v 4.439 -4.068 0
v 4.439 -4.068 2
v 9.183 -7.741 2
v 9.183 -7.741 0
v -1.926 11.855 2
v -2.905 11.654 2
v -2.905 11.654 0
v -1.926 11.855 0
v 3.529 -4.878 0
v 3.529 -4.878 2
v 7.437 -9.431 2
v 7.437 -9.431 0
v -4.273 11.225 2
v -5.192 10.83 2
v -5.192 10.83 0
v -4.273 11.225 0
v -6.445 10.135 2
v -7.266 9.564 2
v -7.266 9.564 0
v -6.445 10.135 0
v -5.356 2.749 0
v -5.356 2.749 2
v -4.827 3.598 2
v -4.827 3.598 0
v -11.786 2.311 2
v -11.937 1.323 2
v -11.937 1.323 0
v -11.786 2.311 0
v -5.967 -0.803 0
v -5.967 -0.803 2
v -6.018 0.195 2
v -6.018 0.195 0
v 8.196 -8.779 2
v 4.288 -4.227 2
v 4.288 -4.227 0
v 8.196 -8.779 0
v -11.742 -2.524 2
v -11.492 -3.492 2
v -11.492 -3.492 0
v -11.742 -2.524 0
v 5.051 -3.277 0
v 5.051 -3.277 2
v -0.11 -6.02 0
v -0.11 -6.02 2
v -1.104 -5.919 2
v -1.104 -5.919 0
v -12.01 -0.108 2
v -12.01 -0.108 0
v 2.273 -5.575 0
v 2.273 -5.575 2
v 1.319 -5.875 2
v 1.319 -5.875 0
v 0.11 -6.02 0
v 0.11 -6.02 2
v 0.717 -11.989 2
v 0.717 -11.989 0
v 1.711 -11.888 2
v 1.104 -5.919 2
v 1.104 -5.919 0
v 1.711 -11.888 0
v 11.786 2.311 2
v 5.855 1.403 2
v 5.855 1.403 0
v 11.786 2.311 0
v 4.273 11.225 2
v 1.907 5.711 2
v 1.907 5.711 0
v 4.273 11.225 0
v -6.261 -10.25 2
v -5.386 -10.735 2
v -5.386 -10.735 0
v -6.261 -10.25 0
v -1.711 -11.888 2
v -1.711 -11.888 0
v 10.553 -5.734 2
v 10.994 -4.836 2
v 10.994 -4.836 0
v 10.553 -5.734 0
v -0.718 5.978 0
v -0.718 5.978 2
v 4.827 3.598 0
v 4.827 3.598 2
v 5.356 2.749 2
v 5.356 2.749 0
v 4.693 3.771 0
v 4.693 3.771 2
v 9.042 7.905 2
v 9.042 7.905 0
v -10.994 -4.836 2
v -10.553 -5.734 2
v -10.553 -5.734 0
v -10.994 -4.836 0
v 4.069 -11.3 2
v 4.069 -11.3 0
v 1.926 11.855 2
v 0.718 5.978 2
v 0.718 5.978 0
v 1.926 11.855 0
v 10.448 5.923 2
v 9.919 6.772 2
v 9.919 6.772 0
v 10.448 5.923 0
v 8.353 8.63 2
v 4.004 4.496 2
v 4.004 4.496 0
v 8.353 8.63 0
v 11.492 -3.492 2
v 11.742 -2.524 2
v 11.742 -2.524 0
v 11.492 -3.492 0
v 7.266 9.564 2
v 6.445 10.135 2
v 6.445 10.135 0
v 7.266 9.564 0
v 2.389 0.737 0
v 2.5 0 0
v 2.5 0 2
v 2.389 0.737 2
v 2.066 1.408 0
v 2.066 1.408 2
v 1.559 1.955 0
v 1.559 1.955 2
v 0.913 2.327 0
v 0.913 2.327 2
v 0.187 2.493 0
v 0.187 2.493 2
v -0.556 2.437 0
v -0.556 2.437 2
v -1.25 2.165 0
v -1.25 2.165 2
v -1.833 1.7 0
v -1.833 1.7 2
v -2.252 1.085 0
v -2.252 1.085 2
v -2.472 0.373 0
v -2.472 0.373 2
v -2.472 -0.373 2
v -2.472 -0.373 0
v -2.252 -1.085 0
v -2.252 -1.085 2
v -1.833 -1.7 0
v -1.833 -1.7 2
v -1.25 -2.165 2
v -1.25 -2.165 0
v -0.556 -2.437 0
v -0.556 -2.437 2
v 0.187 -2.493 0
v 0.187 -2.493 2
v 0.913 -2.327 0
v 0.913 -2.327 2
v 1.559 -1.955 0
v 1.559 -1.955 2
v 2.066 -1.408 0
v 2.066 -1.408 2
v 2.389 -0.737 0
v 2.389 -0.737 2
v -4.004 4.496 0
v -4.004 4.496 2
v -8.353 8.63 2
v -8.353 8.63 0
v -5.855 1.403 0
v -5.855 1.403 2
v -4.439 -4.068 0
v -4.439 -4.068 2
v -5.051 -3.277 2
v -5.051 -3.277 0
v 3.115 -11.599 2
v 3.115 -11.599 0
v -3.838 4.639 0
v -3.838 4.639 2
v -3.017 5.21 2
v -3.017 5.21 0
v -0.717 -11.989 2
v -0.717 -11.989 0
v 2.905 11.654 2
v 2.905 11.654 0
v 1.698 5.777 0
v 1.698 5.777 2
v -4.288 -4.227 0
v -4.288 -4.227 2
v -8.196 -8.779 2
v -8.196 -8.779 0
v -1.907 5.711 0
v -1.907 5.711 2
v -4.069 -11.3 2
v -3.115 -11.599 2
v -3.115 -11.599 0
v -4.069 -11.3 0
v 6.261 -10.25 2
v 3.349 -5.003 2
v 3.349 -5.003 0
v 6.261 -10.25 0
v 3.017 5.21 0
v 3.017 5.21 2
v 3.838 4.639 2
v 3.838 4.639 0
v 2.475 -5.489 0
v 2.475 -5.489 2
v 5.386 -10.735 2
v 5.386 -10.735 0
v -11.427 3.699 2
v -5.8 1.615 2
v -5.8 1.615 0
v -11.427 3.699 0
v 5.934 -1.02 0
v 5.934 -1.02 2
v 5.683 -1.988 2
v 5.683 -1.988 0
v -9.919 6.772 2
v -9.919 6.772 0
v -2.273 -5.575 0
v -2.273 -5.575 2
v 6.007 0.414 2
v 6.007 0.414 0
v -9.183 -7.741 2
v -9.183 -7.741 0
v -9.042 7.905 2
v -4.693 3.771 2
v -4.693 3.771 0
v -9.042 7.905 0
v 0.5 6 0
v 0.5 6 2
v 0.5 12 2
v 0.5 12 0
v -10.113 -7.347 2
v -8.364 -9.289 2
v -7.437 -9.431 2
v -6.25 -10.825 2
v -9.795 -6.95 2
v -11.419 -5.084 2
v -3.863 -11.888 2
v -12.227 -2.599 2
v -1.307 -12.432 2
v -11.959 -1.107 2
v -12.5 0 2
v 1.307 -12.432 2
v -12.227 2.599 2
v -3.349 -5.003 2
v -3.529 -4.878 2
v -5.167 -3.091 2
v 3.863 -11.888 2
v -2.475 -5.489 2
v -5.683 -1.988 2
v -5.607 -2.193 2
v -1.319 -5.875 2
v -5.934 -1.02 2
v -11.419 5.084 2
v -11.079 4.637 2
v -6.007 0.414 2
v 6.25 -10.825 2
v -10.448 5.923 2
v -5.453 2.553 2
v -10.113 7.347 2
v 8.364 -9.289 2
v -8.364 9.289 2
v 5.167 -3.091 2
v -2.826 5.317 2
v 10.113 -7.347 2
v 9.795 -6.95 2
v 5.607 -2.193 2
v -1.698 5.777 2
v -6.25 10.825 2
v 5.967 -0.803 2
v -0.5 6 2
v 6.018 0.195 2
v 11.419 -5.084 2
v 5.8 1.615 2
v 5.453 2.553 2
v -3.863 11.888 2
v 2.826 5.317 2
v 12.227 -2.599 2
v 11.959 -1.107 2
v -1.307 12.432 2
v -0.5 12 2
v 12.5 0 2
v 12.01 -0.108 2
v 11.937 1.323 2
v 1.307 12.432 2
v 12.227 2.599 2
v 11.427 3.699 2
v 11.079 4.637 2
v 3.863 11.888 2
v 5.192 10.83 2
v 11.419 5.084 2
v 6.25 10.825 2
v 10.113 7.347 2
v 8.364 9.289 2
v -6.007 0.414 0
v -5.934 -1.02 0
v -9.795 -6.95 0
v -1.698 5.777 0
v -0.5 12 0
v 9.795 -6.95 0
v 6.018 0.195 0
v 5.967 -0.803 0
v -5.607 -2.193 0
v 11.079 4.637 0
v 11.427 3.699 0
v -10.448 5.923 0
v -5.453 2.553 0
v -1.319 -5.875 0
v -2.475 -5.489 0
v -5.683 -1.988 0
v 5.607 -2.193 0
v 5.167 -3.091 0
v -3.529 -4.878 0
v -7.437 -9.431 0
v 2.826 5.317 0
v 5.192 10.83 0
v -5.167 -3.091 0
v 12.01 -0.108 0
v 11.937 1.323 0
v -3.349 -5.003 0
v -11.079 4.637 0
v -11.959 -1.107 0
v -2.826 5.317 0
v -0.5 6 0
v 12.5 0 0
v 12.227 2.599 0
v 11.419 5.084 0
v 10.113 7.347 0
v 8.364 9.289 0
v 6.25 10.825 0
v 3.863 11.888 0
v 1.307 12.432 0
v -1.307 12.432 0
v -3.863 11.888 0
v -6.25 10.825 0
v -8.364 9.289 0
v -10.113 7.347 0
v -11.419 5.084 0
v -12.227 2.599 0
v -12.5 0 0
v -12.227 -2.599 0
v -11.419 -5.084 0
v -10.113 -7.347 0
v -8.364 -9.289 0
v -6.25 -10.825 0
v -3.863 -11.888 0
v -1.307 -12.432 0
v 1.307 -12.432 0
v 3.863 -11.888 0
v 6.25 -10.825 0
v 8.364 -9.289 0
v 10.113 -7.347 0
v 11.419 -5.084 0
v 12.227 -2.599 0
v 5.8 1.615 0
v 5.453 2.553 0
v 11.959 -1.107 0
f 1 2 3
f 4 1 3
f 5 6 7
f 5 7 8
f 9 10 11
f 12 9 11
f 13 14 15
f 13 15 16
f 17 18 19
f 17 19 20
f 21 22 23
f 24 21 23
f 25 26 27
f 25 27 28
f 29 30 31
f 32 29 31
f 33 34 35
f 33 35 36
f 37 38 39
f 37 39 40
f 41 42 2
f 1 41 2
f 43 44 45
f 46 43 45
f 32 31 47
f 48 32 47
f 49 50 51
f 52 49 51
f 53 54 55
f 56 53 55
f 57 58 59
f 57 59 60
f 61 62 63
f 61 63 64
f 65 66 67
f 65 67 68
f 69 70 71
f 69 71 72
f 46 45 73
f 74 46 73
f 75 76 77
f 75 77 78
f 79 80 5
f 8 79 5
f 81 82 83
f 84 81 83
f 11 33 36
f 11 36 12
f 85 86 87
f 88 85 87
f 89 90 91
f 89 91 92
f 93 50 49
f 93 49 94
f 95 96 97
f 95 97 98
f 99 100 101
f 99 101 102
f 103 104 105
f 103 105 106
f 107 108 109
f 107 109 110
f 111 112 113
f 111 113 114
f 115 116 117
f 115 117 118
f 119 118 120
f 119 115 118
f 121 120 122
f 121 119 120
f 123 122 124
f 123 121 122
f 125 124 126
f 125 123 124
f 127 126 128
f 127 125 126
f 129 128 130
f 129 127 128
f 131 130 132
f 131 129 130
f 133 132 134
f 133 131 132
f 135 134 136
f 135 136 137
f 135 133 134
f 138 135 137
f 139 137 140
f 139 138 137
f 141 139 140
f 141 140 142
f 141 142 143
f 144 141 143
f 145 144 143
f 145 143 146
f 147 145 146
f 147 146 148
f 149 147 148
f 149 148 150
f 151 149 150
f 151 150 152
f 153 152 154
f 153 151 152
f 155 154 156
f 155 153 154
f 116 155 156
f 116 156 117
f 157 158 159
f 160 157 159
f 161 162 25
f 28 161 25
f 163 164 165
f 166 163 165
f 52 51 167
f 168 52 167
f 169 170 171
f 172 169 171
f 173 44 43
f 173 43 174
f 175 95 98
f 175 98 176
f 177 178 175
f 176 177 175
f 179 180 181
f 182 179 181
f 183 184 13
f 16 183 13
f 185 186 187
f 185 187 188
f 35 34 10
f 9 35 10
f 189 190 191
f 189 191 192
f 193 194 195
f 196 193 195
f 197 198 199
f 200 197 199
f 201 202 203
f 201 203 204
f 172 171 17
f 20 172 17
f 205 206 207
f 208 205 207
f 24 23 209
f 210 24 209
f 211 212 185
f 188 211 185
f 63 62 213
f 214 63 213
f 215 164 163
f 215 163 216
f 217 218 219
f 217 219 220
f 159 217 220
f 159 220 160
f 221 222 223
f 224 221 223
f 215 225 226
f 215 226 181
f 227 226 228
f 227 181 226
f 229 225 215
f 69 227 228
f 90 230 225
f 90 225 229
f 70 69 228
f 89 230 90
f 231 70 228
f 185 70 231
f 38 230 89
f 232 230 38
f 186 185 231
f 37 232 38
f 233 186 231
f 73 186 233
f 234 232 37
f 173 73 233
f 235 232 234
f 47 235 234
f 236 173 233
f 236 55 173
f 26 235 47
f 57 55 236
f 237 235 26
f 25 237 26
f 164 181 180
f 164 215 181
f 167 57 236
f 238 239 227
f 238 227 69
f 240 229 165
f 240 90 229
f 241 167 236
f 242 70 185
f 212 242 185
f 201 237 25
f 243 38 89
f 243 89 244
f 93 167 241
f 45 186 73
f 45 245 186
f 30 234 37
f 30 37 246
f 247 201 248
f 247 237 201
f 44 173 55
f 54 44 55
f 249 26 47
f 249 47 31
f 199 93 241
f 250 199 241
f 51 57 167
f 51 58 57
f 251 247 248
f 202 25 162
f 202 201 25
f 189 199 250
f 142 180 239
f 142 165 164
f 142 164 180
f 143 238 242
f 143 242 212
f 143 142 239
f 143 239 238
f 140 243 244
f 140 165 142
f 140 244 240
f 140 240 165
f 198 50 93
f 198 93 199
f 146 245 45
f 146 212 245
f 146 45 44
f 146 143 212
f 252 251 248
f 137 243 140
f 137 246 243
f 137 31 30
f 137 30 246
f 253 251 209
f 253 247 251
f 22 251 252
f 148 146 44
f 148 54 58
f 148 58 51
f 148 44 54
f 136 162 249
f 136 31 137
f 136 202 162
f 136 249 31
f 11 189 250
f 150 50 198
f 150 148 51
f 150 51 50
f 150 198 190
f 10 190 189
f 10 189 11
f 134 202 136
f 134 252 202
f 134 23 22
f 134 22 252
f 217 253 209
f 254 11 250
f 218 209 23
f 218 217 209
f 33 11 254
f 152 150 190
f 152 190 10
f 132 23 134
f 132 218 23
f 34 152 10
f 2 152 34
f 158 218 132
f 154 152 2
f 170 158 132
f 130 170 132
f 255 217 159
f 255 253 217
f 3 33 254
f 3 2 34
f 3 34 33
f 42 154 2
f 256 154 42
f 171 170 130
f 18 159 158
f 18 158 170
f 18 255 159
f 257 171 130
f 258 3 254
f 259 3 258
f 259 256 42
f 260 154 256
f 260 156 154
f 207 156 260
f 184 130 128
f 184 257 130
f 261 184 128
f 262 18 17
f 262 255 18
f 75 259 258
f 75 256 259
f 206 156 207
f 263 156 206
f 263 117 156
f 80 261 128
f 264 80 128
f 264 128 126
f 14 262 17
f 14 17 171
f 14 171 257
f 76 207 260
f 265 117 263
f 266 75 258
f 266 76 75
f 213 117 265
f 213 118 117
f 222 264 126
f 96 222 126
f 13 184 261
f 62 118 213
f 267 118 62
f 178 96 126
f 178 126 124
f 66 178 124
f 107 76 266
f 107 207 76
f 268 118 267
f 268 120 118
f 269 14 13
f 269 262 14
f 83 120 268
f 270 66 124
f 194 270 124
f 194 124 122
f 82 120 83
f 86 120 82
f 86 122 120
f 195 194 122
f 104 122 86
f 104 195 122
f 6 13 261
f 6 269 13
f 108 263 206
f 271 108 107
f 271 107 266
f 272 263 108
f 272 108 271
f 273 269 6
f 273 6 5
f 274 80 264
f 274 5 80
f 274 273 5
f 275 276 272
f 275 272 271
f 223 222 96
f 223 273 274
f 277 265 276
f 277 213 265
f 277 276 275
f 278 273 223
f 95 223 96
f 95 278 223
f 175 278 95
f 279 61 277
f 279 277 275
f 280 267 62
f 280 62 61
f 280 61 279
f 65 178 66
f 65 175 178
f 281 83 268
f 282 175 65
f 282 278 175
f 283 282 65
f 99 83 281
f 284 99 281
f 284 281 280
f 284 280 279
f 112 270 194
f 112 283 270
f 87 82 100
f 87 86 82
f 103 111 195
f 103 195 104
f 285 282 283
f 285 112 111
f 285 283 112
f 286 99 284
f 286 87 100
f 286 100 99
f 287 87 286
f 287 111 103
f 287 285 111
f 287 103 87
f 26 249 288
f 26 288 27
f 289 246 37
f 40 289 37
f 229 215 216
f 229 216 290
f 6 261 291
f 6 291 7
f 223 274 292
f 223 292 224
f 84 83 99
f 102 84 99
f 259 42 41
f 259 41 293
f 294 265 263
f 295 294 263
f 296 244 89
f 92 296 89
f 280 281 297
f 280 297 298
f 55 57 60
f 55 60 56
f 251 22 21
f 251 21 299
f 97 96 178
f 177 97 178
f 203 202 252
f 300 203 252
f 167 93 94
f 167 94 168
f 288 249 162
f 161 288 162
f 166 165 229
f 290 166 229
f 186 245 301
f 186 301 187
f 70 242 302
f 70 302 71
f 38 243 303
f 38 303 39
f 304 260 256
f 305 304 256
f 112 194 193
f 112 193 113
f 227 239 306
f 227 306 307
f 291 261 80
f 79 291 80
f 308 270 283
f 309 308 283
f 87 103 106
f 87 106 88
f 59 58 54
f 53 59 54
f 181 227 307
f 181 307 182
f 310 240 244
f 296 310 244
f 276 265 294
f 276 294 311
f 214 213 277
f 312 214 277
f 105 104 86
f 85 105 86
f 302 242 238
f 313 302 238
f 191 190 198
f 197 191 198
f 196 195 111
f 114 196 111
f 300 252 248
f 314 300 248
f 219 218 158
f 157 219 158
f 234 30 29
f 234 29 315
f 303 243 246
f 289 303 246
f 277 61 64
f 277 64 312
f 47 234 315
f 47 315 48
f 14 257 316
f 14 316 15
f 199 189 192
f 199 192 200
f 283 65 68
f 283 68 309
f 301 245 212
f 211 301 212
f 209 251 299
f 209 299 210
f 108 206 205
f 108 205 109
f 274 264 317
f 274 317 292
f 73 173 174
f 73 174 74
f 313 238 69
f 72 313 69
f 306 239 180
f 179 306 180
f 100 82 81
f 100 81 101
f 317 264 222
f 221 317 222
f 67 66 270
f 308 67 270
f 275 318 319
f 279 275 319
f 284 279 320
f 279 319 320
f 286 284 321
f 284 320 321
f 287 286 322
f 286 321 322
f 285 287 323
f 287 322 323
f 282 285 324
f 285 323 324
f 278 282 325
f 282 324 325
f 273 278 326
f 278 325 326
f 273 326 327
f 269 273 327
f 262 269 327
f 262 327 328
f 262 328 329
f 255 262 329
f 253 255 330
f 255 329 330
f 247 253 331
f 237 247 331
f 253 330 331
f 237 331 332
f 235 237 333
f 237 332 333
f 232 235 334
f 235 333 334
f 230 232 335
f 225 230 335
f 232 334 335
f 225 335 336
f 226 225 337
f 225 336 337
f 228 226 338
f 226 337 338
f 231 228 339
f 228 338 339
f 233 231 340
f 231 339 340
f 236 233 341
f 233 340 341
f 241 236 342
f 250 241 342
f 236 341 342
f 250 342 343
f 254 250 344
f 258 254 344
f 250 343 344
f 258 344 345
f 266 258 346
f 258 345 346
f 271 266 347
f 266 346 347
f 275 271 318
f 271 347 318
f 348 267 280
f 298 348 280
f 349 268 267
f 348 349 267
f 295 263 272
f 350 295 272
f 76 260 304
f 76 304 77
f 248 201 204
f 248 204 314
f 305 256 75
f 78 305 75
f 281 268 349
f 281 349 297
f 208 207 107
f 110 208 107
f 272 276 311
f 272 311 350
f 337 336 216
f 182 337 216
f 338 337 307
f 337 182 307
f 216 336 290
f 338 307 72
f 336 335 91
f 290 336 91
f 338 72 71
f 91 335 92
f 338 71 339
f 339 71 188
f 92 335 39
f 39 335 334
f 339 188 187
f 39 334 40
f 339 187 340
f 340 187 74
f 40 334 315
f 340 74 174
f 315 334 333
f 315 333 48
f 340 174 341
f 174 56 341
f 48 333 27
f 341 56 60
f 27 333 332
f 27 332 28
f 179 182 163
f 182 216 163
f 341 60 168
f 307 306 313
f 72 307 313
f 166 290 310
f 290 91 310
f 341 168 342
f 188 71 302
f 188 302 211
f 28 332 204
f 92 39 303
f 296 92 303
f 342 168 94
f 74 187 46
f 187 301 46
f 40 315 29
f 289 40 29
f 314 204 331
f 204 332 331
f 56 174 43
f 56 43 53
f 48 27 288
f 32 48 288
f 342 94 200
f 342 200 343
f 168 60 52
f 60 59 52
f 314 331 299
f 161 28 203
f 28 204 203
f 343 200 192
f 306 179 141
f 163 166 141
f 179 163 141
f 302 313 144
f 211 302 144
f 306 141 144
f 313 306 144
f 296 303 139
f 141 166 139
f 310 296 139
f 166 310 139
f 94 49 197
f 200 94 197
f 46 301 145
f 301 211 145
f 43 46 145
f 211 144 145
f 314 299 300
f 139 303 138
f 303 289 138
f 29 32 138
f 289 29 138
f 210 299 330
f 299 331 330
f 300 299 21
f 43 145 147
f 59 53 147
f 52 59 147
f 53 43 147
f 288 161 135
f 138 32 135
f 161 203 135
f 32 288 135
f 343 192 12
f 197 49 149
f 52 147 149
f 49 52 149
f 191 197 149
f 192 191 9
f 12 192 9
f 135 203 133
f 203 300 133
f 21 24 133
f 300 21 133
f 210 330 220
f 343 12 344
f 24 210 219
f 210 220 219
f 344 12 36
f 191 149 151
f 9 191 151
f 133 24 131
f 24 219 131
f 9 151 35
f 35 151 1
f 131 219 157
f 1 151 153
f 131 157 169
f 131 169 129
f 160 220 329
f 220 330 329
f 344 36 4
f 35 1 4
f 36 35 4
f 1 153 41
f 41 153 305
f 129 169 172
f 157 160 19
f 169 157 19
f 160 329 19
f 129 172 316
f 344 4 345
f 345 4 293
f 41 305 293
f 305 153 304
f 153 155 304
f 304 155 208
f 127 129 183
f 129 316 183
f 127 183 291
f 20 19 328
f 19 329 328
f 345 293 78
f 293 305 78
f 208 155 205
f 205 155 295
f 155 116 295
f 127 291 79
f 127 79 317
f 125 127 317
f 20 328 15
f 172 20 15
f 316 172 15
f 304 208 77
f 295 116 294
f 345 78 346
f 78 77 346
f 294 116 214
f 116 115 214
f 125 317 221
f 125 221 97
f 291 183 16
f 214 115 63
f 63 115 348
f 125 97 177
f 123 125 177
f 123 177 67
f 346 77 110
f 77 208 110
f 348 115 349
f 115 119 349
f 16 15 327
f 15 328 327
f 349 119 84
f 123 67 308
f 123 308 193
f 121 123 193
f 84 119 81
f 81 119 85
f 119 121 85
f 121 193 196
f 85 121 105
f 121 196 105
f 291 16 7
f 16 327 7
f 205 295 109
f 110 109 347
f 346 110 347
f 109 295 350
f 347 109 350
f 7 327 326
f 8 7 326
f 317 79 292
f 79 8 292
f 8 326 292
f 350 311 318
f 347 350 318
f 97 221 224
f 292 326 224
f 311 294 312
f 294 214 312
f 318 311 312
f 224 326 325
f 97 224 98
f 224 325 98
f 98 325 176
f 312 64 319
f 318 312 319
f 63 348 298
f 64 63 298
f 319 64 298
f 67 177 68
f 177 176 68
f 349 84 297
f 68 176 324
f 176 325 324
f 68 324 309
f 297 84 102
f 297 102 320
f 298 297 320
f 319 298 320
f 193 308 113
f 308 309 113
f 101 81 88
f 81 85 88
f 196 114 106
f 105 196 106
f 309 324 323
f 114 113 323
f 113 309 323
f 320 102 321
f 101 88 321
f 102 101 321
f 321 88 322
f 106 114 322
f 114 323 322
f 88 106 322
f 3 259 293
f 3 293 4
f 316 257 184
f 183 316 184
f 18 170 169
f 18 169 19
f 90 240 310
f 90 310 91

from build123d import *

# Parameters (mm, degrees)
SKIZZE1_R                       = 12.5
SKIZZE1_R_2                     = 2.5
AUFSATZ_LINEAR_AUSTRAGEN1_DEPTH = 2
SKIZZE2_W                       = 1
SKIZZE2_H                       = 6
SCHNITT_LINEAR_AUSTRAGEN1_DEPTH = 2
KREISMUSTER1_COUNT              = 31


with BuildPart() as part:
    # Skizze1 → Aufsatz-Linear austragen1 (new body)
    with BuildSketch(Plane.XY):
        Circle(SKIZZE1_R)
        Circle(SKIZZE1_R_2, mode=Mode.SUBTRACT)
    extrude(amount=AUFSATZ_LINEAR_AUSTRAGEN1_DEPTH)

    # Skizze2 → Schnitt-Linear austragen1 (cut)
    with BuildSketch(Plane.XY.offset(2)):
        with Locations((0, 9)):
            Rectangle(SKIZZE2_W, SKIZZE2_H)
    schnitt_linear_austragen1 = extrude(amount=-SCHNITT_LINEAR_AUSTRAGEN1_DEPTH, mode=Mode.SUBTRACT)

    # Kreismuster1: Schnitt-Linear austragen1 ×31 about axis
    kreismuster1_axis = Axis((0, 0, 0), (0, 0, 1))
    for i in range(1, KREISMUSTER1_COUNT):
        add(schnitt_linear_austragen1.rotate(kreismuster1_axis, i * 360 / KREISMUSTER1_COUNT), mode=Mode.SUBTRACT)


solid = part.part
